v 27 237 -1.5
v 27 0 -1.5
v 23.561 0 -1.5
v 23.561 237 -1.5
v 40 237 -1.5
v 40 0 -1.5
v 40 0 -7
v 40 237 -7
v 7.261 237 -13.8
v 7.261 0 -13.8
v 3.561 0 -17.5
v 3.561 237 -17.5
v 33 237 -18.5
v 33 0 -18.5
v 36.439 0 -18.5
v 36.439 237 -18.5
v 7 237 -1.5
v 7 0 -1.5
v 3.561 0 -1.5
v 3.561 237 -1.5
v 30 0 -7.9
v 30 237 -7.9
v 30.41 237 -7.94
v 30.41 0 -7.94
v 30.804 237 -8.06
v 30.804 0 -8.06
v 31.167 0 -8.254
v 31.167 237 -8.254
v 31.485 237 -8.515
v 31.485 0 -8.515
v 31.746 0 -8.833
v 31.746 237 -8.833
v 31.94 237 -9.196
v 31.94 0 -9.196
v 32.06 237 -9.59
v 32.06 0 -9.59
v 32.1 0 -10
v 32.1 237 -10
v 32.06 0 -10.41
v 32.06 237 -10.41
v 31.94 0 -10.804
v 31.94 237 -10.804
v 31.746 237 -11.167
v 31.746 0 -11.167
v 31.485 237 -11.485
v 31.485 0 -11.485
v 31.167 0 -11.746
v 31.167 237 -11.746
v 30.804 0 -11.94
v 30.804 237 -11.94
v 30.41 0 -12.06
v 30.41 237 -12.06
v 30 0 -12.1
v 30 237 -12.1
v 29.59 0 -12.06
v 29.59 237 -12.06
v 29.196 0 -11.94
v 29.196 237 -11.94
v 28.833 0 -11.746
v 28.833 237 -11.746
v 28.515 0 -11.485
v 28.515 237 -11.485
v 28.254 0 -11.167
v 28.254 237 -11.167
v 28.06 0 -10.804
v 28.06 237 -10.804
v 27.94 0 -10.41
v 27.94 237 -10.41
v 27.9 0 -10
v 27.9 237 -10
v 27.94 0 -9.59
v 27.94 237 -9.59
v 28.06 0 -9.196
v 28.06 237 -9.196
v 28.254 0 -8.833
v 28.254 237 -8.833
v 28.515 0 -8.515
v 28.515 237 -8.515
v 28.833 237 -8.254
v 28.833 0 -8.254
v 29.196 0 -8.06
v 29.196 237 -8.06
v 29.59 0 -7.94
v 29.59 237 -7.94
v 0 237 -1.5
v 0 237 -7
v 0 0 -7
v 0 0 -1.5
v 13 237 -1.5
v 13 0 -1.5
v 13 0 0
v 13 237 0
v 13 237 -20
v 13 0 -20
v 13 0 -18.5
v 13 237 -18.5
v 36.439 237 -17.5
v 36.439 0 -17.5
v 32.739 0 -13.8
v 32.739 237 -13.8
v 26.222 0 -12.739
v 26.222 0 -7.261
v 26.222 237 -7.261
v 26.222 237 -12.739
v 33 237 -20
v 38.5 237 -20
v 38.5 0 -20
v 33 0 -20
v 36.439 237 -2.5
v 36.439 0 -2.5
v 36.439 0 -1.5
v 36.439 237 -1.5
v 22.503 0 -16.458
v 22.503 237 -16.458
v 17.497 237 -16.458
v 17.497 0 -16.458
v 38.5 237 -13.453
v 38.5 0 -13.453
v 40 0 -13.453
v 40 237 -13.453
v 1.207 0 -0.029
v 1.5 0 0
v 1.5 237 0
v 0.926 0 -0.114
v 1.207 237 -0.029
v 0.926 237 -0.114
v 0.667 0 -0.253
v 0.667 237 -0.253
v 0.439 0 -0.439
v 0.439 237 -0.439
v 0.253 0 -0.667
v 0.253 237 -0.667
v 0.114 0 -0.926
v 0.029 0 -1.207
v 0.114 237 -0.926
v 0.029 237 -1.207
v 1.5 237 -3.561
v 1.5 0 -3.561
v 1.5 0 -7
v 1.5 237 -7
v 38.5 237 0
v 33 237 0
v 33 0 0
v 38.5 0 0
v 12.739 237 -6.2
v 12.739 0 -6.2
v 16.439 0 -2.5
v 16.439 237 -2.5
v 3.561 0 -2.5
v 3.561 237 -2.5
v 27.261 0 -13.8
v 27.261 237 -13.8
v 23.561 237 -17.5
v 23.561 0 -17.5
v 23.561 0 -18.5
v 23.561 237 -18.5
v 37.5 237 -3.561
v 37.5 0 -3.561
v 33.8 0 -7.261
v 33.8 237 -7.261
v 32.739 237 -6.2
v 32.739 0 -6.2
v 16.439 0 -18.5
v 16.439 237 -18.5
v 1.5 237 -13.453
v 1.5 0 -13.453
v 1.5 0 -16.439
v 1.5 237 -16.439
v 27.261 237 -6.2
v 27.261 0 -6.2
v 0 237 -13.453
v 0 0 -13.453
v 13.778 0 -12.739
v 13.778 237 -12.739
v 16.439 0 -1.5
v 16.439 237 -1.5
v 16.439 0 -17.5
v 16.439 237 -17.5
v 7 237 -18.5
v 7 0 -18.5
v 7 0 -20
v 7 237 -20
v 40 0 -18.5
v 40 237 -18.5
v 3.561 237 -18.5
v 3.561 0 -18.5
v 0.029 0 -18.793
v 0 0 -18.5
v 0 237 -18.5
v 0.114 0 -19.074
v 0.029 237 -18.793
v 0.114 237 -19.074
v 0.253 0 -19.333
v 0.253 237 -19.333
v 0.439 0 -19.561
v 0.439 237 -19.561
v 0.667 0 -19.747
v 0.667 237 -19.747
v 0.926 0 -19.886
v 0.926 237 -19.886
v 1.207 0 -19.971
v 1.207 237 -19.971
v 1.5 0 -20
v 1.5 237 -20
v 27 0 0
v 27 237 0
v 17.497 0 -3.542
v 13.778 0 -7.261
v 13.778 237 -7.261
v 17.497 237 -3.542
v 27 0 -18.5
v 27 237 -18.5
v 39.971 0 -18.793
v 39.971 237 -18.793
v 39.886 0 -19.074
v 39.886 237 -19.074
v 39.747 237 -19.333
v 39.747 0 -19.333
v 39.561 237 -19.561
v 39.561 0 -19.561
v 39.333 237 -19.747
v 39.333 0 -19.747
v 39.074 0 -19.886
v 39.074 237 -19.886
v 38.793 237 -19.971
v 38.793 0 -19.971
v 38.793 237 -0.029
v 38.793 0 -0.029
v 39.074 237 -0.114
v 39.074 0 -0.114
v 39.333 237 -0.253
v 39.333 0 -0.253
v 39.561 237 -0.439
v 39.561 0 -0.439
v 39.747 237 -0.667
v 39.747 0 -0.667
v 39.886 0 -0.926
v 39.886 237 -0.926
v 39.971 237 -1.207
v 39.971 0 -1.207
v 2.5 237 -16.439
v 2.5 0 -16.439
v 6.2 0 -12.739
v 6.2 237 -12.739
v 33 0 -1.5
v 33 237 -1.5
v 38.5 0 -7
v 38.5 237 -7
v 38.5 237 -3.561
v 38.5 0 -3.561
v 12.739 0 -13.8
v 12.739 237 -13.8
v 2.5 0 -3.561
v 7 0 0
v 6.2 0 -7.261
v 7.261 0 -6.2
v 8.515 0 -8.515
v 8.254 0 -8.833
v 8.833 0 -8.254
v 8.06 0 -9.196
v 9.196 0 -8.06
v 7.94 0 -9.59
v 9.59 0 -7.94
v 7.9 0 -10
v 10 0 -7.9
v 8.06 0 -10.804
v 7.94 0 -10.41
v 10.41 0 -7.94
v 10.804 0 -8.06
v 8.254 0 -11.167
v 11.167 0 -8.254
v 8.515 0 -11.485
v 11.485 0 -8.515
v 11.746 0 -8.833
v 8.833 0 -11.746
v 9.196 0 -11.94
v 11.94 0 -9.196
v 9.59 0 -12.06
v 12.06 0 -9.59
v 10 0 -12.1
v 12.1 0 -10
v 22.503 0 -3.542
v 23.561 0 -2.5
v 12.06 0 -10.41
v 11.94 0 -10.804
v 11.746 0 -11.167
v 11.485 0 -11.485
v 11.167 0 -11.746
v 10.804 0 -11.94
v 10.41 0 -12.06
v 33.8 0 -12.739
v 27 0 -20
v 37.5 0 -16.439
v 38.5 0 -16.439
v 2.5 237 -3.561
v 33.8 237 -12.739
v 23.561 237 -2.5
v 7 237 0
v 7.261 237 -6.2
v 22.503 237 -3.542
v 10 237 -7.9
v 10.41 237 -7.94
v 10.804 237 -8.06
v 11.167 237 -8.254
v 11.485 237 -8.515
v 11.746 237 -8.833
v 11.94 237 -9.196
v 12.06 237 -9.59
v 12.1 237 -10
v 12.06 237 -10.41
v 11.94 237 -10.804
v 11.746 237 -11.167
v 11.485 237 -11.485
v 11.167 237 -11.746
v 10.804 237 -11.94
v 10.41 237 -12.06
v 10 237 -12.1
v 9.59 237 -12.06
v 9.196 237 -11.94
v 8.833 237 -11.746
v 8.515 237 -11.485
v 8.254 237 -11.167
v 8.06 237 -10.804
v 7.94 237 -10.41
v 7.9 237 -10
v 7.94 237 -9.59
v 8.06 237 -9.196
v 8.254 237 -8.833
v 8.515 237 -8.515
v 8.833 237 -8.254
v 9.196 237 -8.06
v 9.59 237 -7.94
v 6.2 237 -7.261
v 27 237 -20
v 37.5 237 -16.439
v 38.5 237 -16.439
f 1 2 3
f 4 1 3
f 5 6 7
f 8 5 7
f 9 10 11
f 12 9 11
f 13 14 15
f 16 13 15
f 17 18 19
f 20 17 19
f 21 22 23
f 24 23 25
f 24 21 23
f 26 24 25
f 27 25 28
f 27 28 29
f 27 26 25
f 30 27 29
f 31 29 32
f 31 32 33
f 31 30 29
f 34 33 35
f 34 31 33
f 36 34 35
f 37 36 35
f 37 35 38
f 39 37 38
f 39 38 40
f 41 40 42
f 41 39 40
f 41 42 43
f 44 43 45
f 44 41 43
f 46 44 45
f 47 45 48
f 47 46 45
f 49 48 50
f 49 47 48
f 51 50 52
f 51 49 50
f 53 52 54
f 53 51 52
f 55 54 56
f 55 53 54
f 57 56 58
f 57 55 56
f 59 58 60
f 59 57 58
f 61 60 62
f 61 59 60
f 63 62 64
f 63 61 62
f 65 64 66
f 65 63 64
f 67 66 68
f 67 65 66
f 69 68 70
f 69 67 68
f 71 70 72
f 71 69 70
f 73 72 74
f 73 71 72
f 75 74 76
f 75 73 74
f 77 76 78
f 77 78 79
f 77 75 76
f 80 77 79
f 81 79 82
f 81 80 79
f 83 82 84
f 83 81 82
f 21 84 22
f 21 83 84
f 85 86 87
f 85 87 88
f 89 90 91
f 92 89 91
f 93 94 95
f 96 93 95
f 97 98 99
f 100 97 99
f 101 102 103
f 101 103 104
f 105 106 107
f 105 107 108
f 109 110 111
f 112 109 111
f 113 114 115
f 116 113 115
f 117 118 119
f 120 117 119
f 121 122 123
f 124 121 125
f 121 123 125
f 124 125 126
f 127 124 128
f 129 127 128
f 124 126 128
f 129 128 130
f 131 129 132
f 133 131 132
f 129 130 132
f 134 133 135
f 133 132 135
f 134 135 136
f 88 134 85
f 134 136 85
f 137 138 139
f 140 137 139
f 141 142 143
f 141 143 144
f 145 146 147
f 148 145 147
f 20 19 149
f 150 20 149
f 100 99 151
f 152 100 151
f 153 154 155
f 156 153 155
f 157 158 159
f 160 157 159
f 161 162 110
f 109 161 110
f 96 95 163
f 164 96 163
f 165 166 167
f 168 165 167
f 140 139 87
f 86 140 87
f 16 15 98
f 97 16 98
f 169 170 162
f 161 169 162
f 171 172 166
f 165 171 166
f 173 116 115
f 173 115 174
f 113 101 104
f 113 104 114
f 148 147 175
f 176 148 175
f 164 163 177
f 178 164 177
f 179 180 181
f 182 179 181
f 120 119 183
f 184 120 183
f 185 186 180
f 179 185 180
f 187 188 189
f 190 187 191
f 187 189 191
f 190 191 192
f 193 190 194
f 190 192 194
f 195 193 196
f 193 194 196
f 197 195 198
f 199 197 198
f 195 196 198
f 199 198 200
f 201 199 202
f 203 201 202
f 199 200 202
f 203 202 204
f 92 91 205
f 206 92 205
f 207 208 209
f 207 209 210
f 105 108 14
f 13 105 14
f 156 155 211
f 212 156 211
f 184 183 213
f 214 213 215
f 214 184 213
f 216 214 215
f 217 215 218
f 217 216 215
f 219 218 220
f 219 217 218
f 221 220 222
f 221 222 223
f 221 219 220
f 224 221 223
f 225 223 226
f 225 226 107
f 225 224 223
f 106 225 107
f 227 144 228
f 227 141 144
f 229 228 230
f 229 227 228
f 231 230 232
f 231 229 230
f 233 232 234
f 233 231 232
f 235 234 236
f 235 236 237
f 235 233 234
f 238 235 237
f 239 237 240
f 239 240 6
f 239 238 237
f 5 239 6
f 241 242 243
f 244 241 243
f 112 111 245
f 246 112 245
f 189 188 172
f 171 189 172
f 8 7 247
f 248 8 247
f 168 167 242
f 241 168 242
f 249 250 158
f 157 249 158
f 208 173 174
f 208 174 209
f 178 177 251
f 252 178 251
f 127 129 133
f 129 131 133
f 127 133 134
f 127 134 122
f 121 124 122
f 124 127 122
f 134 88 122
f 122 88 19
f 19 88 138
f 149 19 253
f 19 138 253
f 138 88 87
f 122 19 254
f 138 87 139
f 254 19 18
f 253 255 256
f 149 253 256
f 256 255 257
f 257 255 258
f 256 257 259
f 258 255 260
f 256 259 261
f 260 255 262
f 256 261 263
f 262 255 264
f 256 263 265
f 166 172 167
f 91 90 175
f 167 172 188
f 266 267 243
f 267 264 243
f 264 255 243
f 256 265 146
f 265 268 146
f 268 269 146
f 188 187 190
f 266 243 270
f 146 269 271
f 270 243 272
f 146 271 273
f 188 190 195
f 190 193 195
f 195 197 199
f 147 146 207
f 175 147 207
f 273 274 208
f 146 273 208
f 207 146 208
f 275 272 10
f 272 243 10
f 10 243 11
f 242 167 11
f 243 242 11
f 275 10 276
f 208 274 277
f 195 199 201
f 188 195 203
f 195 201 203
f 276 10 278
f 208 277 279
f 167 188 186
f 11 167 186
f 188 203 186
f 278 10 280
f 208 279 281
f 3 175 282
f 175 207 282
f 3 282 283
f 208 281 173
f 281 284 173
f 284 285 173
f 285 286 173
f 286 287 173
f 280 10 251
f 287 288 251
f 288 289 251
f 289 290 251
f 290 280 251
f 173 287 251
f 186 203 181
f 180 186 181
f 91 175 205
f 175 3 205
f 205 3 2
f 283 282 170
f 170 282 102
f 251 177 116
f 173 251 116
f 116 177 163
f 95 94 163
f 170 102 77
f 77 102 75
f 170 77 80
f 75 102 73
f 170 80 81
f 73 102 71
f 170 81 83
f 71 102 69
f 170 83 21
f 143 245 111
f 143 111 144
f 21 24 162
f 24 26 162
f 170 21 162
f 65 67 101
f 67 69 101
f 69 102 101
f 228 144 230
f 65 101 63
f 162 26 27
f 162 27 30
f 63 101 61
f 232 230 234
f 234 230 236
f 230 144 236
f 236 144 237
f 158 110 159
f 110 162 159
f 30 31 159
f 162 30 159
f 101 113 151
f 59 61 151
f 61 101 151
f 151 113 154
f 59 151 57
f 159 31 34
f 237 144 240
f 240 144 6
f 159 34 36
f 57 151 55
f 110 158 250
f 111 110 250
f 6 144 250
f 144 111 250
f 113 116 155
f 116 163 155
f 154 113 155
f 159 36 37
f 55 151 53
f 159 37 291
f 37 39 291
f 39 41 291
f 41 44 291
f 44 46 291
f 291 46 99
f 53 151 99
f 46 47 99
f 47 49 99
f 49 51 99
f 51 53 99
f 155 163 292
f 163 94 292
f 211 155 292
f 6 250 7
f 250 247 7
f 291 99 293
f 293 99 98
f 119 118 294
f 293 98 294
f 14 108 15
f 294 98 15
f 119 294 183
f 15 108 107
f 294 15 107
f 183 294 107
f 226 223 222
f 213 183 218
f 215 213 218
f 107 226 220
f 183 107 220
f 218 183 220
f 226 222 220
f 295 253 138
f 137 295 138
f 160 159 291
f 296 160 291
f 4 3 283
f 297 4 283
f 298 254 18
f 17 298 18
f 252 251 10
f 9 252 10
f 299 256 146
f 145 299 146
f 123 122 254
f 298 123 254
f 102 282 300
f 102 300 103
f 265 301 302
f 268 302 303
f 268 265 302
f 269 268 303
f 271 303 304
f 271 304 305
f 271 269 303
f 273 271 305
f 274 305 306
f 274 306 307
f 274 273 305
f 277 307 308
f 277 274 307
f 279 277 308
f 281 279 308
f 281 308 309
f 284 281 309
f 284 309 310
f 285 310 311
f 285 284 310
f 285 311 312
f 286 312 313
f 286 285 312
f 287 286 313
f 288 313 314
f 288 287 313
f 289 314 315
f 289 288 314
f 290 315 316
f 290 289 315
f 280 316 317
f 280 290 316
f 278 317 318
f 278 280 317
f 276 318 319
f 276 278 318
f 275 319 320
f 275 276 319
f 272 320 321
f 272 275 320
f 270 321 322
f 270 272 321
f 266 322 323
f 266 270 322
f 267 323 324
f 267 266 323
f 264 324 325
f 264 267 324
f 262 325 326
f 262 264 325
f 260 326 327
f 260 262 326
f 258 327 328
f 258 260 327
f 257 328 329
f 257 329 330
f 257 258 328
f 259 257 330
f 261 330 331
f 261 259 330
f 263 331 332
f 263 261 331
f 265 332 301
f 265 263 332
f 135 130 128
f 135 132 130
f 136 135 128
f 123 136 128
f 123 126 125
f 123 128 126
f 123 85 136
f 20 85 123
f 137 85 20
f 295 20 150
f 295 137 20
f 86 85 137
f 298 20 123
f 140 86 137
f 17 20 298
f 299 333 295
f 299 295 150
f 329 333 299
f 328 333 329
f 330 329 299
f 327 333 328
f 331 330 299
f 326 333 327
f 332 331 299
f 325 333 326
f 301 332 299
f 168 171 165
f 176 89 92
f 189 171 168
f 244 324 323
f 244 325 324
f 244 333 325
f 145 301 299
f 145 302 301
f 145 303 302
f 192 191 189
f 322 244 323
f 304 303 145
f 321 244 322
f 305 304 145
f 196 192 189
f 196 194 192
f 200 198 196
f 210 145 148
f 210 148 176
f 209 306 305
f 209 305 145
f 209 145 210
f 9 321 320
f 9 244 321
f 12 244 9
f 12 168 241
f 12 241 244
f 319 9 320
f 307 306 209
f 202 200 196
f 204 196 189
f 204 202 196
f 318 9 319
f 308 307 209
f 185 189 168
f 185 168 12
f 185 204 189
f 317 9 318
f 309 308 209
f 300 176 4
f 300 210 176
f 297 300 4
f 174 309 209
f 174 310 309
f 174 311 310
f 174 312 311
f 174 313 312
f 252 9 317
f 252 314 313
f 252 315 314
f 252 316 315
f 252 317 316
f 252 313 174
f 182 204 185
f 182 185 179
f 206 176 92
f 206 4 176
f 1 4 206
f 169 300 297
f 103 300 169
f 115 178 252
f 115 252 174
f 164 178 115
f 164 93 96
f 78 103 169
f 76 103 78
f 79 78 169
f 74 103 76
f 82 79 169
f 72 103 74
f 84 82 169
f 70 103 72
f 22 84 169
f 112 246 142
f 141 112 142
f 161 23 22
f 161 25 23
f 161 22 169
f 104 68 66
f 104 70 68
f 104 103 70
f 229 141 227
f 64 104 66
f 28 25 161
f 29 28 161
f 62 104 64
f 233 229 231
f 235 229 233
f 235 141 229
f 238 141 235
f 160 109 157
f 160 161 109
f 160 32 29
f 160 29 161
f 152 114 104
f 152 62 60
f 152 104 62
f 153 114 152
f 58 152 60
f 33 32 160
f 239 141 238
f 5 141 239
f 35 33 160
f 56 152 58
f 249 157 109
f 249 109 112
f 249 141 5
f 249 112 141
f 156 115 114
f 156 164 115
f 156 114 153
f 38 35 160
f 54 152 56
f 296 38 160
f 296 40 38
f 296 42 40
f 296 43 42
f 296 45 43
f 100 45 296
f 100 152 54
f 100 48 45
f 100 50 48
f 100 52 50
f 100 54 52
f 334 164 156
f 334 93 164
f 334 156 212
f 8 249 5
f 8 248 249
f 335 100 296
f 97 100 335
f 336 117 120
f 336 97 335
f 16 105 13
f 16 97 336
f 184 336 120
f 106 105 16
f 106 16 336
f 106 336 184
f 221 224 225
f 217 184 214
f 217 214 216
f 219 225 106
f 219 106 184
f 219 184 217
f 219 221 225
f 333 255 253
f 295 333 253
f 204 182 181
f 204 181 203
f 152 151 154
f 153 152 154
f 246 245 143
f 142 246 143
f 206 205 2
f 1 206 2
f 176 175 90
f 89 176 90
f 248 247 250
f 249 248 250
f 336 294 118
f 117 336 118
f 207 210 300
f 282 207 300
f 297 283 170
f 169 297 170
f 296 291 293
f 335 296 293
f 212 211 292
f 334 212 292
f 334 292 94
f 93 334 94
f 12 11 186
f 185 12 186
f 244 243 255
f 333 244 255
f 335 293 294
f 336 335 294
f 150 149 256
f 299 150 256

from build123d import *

# Parameters (mm, degrees)
SKETCH1_R           = 2.1
BOSS_EXTRUDE1_DEPTH = 237
FILLET1_R           = 1.5


with BuildPart() as part:
    # Sketch1 → Boss-Extrude1 (new body)
    with BuildSketch(Plane(origin=(0, 0, 0), x_dir=(1, 0, 0), z_dir=(0, 1, 0))):
        Polygon((0, 0), (7, 0), (7, 1.5), (3.560660172, 1.5), (3.560660172, 2.5), (7.260660172, 6.2), (12.739339828, 6.2), (16.439339828, 2.5), (16.439339828, 1.5), (13, 1.5), (13, 0), (27, 0), (27, 1.5), (23.560660172, 1.5), (23.560660172, 2.5), (27.260660172, 6.2), (32.739339828, 6.2), (36.439339828, 2.5), (36.439339828, 1.5), (33, 1.5), (33, 0), (40, 0), (40, 7), (38.5, 7), (38.5, 3.560660172), (37.5, 3.560660172), (33.8, 7.260660172), (33.8, 12.739339828), (37.5, 16.439339828), (38.5, 16.439339828), (38.5, 13.45318801), (40, 13.45318801), (40, 20), (33, 20), (33, 18.5), (36.439339828, 18.5), (36.439339828, 17.5), (32.739339828, 13.8), (27.260660172, 13.8), (23.560660172, 17.5), (23.560660172, 18.5), (27, 18.5), (27, 20), (13, 20), (13, 18.5), (16.439339828, 18.5), (16.439339828, 17.5), (12.739339828, 13.8), (7.260660172, 13.8), (3.560660172, 17.5), (3.560660172, 18.5), (7, 18.5), (7, 20), (0, 20), (0, 13.45318801), (1.5, 13.45318801), (1.5, 16.439339828), (2.5, 16.439339828), (6.2, 12.739339828), (6.2, 7.260660172), (2.5, 3.560660172), (1.5, 3.560660172), (1.5, 7), (0, 7), align=None)
        with Locations(Location((10, 10, 0), (0, 0, 270))):
            Circle(SKETCH1_R, mode=Mode.SUBTRACT)
        with Locations(Location((30, 10, 0), (0, 0, 270))):
            Circle(SKETCH1_R, mode=Mode.SUBTRACT)
        Polygon((17.496963478, 16.458315541), (13.777987766, 12.739339828), (13.777987766, 7.260660172), (17.496963478, 3.541684459), (22.503036522, 3.541684459), (26.222012234, 7.260660172), (26.222012234, 12.739339828), (22.503036522, 16.458315541), align=None, mode=Mode.SUBTRACT)
    extrude(amount=BOSS_EXTRUDE1_DEPTH)

    # Fillet1
    fillet1_edges = [part.edges().sort_by_distance(p)[0] for p in [
        (40, 118.5, -20),
        (40, 118.5, 0),
        (0, 118.5, 0),
        (0, 118.5, -20),
    ]]
    fillet(fillet1_edges, radius=FILLET1_R)


solid = part.part
